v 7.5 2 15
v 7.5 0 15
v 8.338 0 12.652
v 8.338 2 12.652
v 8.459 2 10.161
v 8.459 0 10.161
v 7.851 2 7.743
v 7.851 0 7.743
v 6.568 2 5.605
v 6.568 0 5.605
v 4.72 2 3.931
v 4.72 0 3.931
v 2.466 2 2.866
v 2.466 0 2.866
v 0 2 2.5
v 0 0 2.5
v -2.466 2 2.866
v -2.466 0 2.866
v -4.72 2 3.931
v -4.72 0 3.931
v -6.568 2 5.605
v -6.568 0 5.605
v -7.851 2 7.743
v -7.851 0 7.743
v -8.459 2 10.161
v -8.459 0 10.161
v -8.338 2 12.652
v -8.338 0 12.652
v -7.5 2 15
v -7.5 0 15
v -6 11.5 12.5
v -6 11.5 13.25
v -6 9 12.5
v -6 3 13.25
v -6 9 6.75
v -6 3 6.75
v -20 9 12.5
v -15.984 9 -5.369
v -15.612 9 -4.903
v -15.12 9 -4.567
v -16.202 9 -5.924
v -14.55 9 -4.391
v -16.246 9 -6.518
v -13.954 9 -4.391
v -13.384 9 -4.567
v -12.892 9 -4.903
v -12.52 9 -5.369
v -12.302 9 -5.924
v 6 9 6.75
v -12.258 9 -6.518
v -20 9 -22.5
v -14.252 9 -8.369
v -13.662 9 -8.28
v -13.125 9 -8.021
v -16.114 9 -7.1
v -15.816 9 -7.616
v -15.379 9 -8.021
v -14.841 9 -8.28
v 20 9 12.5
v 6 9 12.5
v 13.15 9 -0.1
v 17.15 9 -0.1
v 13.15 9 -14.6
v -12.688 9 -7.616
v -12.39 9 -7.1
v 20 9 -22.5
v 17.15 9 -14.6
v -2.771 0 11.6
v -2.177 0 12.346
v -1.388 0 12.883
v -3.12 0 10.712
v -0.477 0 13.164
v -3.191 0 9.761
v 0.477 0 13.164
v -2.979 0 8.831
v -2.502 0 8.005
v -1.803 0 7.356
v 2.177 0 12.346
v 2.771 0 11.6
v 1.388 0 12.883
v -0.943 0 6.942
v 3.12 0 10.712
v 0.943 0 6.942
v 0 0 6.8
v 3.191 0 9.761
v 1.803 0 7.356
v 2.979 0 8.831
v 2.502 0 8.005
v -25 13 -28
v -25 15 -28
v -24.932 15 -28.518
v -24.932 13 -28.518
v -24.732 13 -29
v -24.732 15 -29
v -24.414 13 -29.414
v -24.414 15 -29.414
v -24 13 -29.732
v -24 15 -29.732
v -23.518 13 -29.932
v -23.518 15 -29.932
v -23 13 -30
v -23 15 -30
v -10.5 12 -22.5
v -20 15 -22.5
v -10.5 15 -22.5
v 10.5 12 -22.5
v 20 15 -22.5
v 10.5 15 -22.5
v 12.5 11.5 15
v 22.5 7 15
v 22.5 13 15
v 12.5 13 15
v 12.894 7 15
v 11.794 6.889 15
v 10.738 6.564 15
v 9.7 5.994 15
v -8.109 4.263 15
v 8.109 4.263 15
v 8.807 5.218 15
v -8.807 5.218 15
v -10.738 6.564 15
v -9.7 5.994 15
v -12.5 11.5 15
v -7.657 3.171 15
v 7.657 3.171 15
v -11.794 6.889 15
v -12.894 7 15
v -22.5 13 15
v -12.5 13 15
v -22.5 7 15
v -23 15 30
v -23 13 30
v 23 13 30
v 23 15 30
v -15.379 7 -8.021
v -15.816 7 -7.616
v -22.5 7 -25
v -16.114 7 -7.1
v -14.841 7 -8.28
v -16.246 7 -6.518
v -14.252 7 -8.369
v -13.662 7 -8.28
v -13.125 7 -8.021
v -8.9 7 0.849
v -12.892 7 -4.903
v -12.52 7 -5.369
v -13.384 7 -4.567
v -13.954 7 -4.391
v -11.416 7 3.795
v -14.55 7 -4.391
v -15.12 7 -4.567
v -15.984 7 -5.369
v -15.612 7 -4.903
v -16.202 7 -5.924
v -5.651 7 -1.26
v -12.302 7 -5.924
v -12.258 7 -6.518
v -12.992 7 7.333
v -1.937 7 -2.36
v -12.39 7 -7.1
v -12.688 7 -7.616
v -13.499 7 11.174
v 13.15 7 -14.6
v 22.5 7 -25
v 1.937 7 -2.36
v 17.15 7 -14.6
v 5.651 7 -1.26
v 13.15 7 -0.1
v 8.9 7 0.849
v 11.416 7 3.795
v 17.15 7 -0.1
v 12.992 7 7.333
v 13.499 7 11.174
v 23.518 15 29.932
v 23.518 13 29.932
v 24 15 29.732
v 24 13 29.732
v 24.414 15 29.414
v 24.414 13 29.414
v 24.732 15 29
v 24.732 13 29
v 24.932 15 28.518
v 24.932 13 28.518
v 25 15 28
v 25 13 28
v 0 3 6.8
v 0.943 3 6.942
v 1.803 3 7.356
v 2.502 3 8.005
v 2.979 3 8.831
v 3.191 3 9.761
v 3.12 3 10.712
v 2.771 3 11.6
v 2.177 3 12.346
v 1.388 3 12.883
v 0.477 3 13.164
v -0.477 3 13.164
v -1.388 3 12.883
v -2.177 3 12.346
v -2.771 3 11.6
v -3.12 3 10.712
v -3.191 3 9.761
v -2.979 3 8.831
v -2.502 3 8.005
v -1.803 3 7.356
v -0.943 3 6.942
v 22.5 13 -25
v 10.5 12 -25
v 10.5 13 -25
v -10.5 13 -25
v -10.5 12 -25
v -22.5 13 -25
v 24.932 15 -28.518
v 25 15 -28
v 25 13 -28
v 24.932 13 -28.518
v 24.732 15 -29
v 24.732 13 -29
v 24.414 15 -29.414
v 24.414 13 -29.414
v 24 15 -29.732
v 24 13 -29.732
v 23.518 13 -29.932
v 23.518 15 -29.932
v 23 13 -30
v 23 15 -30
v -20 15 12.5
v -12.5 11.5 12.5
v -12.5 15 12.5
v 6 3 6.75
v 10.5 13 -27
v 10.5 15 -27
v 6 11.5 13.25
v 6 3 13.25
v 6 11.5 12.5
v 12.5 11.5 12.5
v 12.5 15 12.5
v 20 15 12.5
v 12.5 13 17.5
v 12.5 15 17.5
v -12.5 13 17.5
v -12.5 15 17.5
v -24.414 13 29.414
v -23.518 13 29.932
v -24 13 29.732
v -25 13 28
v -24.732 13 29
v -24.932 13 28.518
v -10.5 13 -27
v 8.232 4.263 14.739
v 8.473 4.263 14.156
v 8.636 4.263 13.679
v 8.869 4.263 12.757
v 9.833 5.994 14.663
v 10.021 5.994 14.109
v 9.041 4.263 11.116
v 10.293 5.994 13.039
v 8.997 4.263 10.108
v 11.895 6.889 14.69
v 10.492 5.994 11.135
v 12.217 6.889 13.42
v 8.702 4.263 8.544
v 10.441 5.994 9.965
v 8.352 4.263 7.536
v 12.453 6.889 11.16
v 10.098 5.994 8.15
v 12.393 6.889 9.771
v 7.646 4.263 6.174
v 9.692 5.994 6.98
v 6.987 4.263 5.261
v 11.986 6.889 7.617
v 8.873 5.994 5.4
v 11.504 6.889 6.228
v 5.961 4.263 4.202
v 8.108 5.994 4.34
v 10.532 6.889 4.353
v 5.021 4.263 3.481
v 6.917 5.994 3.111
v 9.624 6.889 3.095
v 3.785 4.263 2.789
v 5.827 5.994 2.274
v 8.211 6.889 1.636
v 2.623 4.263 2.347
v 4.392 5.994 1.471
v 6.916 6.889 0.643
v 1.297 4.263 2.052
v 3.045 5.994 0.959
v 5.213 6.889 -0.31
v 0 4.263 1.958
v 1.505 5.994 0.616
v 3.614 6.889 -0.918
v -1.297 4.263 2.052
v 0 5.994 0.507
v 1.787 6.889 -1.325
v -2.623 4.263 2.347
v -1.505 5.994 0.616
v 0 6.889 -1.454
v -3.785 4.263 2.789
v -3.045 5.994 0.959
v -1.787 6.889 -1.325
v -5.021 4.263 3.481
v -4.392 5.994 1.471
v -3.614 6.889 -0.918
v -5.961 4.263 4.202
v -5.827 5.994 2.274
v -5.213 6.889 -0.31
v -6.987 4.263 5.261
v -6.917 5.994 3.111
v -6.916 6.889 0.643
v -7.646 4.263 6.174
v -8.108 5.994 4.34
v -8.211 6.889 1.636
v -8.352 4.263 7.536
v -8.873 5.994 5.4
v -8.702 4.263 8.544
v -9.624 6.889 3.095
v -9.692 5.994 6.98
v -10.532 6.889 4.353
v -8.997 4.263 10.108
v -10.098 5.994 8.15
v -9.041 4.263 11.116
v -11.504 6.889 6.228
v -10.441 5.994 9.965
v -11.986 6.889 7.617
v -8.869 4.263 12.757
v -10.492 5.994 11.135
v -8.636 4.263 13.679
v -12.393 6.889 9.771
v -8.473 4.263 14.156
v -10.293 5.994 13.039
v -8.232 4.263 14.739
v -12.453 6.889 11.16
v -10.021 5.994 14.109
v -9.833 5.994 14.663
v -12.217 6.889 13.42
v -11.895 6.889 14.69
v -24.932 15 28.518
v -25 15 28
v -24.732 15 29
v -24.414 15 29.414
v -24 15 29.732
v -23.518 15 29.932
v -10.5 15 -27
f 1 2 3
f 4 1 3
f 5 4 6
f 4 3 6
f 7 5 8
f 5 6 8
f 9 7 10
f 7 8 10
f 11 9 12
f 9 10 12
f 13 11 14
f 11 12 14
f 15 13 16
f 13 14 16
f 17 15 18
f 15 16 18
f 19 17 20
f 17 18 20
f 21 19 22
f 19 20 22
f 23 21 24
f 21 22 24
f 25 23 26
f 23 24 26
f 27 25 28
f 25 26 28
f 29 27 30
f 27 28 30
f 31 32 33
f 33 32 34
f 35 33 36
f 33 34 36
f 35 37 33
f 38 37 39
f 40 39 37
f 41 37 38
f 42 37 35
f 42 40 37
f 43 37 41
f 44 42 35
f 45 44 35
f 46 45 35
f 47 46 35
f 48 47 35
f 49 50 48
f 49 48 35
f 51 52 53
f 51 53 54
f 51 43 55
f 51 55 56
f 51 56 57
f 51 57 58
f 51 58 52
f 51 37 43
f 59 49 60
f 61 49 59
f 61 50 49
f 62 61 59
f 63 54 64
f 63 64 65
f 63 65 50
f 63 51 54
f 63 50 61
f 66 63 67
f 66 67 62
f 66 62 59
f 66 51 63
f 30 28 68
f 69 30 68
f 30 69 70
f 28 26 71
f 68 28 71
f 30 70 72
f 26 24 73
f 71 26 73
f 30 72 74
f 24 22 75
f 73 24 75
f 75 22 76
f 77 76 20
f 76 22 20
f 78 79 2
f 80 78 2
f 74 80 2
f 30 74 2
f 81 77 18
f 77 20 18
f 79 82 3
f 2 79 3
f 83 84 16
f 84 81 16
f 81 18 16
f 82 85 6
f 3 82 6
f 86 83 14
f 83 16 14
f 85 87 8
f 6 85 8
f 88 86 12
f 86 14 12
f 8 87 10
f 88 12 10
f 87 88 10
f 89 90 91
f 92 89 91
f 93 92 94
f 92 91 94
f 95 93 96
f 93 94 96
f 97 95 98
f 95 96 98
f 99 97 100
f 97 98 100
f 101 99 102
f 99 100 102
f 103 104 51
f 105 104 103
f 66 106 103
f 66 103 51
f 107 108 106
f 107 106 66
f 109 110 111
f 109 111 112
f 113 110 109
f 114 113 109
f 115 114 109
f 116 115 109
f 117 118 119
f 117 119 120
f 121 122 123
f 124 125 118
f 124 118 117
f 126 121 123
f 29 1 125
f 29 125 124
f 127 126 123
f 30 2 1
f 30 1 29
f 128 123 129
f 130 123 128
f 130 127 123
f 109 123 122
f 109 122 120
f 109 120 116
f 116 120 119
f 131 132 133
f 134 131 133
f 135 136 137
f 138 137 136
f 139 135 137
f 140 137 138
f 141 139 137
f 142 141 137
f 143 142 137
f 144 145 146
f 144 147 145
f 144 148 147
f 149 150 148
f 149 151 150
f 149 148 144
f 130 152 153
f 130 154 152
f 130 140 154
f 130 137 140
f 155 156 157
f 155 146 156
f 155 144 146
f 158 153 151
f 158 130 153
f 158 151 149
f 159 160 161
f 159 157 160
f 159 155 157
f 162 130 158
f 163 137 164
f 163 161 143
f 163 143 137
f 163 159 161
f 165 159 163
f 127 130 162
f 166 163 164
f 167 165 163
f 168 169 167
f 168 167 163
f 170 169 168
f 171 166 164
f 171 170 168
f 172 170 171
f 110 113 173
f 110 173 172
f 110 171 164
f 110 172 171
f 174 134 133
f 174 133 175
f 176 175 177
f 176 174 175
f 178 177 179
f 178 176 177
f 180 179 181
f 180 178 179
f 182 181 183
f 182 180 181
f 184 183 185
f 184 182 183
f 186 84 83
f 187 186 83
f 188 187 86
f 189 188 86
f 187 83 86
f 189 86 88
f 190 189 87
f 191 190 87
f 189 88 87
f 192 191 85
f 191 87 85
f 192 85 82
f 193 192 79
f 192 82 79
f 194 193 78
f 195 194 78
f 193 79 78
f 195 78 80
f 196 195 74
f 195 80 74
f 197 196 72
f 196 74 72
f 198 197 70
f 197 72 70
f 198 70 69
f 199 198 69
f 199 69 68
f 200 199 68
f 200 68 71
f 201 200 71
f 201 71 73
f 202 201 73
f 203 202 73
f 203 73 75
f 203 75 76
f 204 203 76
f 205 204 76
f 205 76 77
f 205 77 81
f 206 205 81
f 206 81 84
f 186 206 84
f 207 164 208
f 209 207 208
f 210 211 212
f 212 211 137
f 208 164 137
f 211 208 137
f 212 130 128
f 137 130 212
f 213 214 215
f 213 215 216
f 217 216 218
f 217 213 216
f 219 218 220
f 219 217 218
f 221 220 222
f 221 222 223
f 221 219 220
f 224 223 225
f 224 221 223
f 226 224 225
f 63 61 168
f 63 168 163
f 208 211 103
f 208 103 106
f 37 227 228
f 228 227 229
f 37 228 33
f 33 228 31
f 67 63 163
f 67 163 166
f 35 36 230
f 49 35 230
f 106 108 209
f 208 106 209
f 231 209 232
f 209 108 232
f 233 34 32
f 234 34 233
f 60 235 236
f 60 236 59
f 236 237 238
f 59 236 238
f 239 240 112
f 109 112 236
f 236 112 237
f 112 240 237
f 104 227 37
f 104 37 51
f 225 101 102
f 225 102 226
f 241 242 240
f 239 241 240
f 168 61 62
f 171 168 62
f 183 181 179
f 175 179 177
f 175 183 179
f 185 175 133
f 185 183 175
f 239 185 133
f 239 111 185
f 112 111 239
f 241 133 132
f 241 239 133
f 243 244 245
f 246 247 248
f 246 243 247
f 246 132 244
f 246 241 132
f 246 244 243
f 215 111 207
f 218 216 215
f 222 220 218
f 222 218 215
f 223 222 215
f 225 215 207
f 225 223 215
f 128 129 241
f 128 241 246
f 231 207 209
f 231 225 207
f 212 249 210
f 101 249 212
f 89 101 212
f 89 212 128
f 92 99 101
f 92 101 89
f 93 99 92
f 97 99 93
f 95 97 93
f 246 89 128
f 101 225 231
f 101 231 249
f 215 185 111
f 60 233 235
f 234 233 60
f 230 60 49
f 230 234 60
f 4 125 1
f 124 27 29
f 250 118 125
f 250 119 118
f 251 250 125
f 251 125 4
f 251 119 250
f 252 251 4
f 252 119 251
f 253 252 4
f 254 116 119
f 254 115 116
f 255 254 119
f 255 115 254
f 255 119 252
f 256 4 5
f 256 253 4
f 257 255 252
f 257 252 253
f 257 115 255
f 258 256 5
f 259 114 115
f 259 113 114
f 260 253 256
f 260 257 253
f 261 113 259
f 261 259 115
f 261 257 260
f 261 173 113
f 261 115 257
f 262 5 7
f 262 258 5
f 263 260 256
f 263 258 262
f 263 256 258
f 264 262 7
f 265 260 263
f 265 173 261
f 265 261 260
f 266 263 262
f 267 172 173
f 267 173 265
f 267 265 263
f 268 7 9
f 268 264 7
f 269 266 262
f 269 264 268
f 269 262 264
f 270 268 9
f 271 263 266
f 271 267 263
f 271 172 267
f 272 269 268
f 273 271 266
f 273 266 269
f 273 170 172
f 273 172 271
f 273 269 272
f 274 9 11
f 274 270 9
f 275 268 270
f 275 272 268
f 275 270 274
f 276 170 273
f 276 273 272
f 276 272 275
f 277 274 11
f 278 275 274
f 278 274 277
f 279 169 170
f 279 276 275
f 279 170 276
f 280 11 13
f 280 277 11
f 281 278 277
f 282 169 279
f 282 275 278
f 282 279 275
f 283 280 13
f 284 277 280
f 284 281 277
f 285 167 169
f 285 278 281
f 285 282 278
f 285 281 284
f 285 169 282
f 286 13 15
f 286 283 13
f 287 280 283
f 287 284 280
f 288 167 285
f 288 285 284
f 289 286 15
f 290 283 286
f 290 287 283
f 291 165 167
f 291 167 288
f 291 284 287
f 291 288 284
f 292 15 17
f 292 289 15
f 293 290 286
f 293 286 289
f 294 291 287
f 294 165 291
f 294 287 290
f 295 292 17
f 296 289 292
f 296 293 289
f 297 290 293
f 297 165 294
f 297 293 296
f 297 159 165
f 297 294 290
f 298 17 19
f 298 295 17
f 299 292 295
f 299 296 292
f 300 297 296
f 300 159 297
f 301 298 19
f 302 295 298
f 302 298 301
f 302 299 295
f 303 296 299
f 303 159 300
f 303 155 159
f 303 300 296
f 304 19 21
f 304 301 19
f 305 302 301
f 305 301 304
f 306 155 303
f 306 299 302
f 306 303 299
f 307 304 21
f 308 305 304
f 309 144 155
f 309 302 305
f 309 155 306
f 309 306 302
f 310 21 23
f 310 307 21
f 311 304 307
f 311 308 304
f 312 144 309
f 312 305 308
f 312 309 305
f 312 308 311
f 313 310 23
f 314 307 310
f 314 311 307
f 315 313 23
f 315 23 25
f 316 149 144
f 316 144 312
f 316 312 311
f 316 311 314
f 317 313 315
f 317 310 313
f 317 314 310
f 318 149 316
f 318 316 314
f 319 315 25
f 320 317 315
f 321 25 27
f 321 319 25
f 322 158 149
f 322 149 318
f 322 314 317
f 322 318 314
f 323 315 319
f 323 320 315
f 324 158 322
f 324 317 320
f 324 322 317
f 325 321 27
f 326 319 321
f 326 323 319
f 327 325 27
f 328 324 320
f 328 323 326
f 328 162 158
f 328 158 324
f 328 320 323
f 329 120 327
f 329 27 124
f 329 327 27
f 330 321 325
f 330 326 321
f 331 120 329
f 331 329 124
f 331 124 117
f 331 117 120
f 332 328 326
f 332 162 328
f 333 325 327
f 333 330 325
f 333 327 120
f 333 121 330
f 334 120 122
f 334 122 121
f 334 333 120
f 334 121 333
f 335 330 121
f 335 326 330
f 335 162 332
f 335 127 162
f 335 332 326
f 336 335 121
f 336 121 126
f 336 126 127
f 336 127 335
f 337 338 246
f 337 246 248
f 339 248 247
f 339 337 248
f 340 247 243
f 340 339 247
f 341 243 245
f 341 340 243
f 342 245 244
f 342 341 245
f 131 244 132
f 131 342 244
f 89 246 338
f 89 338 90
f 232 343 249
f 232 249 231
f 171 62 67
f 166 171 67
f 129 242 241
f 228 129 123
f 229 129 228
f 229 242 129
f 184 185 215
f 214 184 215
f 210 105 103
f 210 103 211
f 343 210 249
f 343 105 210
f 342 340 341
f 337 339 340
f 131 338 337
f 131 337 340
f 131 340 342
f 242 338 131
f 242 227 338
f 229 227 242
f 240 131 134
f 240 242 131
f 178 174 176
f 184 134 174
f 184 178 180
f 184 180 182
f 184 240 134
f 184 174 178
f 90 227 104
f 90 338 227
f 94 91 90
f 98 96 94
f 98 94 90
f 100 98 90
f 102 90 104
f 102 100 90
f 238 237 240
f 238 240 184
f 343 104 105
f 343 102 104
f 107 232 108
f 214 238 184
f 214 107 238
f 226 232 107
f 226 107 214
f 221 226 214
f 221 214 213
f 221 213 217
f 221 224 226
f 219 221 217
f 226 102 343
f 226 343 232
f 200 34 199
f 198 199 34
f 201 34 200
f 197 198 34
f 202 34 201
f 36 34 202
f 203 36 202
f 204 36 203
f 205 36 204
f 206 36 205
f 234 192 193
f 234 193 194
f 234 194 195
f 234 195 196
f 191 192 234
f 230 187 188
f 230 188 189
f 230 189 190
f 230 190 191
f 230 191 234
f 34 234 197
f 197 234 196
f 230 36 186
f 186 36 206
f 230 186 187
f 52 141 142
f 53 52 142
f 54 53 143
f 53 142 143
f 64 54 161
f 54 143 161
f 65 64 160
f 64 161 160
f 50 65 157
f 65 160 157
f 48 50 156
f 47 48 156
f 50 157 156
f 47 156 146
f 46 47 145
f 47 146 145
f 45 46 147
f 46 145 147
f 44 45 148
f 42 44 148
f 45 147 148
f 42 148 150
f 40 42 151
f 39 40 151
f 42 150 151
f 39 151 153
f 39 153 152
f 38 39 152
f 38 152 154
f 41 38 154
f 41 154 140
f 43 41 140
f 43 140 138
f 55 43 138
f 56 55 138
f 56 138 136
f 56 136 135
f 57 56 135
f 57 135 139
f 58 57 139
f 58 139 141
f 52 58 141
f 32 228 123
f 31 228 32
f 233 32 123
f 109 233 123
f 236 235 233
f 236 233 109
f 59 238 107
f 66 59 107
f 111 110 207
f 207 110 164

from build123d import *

# Parameters (mm, degrees)
SKETCH1_W               = 50
SKETCH1_H               = 60
BOSS_EXTRUDE1_DEPTH     = 15
FILLET1_R               = 2
SKETCH2_W               = 40
SKETCH2_H               = 35
CUT_EXTRUDE1_DEPTH      = 6
SKETCH3_W               = 4
SKETCH3_H               = 14.5
CUT_EXTRUDE2_DEPTH      = 10
SKETCH4_R               = 2
CUT_EXTRUDE3_DEPTH      = 10
CUT_EXTRUDE4_DEPTH      = 5
CUT_EXTRUDE4_DEPTH_BACK = 6
SKETCH5_W               = 12
SKETCH5_H               = 6.5
SKETCH6_R               = 3.2
CUT_EXTRUDE5_DEPTH      = 8
SKETCH7_W               = 25
SKETCH7_H               = 10
CUT_EXTRUDE6_DEPTH      = 3.5
SKETCH8_W               = 51.392130936
SKETCH8_H               = 62.084358578
SKETCH8_W_2             = 45
SKETCH8_H_2             = 40
CUT_EXTRUDE7_DEPTH      = 13
SKETCH9_W               = 21
SKETCH9_H               = 9
CUT_EXTRUDE8_DEPTH      = 3
CUT_EXTRUDE9_DEPTH      = 7
FILLET2_R               = 5


with BuildPart() as part:
    # Sketch1 → Boss-Extrude1 (new body)
    with BuildSketch(Plane(origin=(0, 0, 0), x_dir=(1, 0, 0), z_dir=(0, 1, 0))):
        Rectangle(SKETCH1_W, SKETCH1_H)
    extrude(amount=BOSS_EXTRUDE1_DEPTH)

    # Fillet1
    fillet1_edges = [part.edges().sort_by_distance(p)[0] for p in [
        (25, 7.5, 30),
        (-25, 7.5, 30),
        (-25, 7.5, -30),
        (25, 7.5, -30),
    ]]
    fillet(fillet1_edges, radius=FILLET1_R)

    # Sketch2 → Cut-Extrude1 (cut)
    with BuildSketch(Plane(origin=(0, 15, 0), x_dir=(1, 0, 0), z_dir=(0, 1, 0))):
        with Locations((0, 5)):
            Rectangle(SKETCH2_W, SKETCH2_H)
    extrude(amount=-CUT_EXTRUDE1_DEPTH, mode=Mode.SUBTRACT)

    # Sketch3 → Cut-Extrude2 (cut)
    with BuildSketch(Plane(origin=(0, 9, 0), x_dir=(1, 0, 0), z_dir=(0, 1, 0))):
        with Locations((15.15, 7.35)):
            Rectangle(SKETCH3_W, SKETCH3_H)
    extrude(amount=-CUT_EXTRUDE2_DEPTH, mode=Mode.SUBTRACT)

    # Sketch4 → Cut-Extrude3 (cut)
    with BuildSketch(Plane.XZ):
        with Locations(Location((-14.251980034, -6.369003384, 0), (0, 0, 270))):
            Circle(SKETCH4_R)
    extrude(amount=-CUT_EXTRUDE3_DEPTH, mode=Mode.SUBTRACT)

    # Sketch5 → Cut-Extrude4 (cut, two sides: drawn at the far end of the back side and taken through both)
    with BuildSketch(Plane(origin=(0, 9, 0), x_dir=(1, 0, 0), z_dir=(0, 1, 0)).offset(-CUT_EXTRUDE4_DEPTH_BACK)):
        with Locations((0, -10)):
            Rectangle(SKETCH5_W, SKETCH5_H)
    extrude(amount=CUT_EXTRUDE4_DEPTH + CUT_EXTRUDE4_DEPTH_BACK, mode=Mode.SUBTRACT)

    # Sketch6 → Cut-Extrude5 (cut)
    with BuildSketch(Plane.XZ):
        with Locations(Location((0, 10, 0), (0, 0, 270))):
            Circle(SKETCH6_R)
    extrude(amount=-CUT_EXTRUDE5_DEPTH, mode=Mode.SUBTRACT)

    # Sketch7 → Cut-Extrude6 (cut)
    with BuildSketch(Plane(origin=(0, 15, 0), x_dir=(1, 0, 0), z_dir=(0, 1, 0))):
        with Locations((0, -12.5)):
            Rectangle(SKETCH7_W, SKETCH7_H)
    extrude(amount=-CUT_EXTRUDE6_DEPTH, mode=Mode.SUBTRACT)

    # Sketch8 → Cut-Extrude7 (cut)
    with BuildSketch(Plane(origin=(0, 0, 0), x_dir=(-1, 0, 0), z_dir=(0, -1, 0))):
        Rectangle(SKETCH8_W, SKETCH8_H)
        with Locations((0, 5)):
            Rectangle(SKETCH8_W_2, SKETCH8_H_2, mode=Mode.SUBTRACT)
    extrude(amount=-CUT_EXTRUDE7_DEPTH, mode=Mode.SUBTRACT)

    # Sketch9 → Cut-Extrude8 (cut)
    with BuildSketch(Plane(origin=(0, 15, 0), x_dir=(1, 0, 0), z_dir=(0, 1, 0))):
        with Locations((0, 22.5)):
            Rectangle(SKETCH9_W, SKETCH9_H)
    extrude(amount=-CUT_EXTRUDE8_DEPTH, mode=Mode.SUBTRACT)

    # Sketch10 → Cut-Extrude9 (cut)
    with BuildSketch(Plane.XZ):
        with BuildLine():
            Line((22.5, 15), (7.5, 15))
            ThreePointArc((7.5, 15), (0, 2.5), (-7.5, 15))
            Line((-7.5, 15), (-22.5, 15))
            Line((-22.5, 15), (-22.5, -25))
            Line((-22.5, -25), (22.5, -25))
            Line((22.5, -25), (22.5, 15))
        make_face()
    extrude(amount=-CUT_EXTRUDE9_DEPTH, mode=Mode.SUBTRACT)

    # Fillet2
    fillet2_edges = [part.edges().sort_by_distance(p)[0] for p in [
        (0, 7, 2.5),
    ]]
    fillet(fillet2_edges, radius=FILLET2_R)


solid = part.part
